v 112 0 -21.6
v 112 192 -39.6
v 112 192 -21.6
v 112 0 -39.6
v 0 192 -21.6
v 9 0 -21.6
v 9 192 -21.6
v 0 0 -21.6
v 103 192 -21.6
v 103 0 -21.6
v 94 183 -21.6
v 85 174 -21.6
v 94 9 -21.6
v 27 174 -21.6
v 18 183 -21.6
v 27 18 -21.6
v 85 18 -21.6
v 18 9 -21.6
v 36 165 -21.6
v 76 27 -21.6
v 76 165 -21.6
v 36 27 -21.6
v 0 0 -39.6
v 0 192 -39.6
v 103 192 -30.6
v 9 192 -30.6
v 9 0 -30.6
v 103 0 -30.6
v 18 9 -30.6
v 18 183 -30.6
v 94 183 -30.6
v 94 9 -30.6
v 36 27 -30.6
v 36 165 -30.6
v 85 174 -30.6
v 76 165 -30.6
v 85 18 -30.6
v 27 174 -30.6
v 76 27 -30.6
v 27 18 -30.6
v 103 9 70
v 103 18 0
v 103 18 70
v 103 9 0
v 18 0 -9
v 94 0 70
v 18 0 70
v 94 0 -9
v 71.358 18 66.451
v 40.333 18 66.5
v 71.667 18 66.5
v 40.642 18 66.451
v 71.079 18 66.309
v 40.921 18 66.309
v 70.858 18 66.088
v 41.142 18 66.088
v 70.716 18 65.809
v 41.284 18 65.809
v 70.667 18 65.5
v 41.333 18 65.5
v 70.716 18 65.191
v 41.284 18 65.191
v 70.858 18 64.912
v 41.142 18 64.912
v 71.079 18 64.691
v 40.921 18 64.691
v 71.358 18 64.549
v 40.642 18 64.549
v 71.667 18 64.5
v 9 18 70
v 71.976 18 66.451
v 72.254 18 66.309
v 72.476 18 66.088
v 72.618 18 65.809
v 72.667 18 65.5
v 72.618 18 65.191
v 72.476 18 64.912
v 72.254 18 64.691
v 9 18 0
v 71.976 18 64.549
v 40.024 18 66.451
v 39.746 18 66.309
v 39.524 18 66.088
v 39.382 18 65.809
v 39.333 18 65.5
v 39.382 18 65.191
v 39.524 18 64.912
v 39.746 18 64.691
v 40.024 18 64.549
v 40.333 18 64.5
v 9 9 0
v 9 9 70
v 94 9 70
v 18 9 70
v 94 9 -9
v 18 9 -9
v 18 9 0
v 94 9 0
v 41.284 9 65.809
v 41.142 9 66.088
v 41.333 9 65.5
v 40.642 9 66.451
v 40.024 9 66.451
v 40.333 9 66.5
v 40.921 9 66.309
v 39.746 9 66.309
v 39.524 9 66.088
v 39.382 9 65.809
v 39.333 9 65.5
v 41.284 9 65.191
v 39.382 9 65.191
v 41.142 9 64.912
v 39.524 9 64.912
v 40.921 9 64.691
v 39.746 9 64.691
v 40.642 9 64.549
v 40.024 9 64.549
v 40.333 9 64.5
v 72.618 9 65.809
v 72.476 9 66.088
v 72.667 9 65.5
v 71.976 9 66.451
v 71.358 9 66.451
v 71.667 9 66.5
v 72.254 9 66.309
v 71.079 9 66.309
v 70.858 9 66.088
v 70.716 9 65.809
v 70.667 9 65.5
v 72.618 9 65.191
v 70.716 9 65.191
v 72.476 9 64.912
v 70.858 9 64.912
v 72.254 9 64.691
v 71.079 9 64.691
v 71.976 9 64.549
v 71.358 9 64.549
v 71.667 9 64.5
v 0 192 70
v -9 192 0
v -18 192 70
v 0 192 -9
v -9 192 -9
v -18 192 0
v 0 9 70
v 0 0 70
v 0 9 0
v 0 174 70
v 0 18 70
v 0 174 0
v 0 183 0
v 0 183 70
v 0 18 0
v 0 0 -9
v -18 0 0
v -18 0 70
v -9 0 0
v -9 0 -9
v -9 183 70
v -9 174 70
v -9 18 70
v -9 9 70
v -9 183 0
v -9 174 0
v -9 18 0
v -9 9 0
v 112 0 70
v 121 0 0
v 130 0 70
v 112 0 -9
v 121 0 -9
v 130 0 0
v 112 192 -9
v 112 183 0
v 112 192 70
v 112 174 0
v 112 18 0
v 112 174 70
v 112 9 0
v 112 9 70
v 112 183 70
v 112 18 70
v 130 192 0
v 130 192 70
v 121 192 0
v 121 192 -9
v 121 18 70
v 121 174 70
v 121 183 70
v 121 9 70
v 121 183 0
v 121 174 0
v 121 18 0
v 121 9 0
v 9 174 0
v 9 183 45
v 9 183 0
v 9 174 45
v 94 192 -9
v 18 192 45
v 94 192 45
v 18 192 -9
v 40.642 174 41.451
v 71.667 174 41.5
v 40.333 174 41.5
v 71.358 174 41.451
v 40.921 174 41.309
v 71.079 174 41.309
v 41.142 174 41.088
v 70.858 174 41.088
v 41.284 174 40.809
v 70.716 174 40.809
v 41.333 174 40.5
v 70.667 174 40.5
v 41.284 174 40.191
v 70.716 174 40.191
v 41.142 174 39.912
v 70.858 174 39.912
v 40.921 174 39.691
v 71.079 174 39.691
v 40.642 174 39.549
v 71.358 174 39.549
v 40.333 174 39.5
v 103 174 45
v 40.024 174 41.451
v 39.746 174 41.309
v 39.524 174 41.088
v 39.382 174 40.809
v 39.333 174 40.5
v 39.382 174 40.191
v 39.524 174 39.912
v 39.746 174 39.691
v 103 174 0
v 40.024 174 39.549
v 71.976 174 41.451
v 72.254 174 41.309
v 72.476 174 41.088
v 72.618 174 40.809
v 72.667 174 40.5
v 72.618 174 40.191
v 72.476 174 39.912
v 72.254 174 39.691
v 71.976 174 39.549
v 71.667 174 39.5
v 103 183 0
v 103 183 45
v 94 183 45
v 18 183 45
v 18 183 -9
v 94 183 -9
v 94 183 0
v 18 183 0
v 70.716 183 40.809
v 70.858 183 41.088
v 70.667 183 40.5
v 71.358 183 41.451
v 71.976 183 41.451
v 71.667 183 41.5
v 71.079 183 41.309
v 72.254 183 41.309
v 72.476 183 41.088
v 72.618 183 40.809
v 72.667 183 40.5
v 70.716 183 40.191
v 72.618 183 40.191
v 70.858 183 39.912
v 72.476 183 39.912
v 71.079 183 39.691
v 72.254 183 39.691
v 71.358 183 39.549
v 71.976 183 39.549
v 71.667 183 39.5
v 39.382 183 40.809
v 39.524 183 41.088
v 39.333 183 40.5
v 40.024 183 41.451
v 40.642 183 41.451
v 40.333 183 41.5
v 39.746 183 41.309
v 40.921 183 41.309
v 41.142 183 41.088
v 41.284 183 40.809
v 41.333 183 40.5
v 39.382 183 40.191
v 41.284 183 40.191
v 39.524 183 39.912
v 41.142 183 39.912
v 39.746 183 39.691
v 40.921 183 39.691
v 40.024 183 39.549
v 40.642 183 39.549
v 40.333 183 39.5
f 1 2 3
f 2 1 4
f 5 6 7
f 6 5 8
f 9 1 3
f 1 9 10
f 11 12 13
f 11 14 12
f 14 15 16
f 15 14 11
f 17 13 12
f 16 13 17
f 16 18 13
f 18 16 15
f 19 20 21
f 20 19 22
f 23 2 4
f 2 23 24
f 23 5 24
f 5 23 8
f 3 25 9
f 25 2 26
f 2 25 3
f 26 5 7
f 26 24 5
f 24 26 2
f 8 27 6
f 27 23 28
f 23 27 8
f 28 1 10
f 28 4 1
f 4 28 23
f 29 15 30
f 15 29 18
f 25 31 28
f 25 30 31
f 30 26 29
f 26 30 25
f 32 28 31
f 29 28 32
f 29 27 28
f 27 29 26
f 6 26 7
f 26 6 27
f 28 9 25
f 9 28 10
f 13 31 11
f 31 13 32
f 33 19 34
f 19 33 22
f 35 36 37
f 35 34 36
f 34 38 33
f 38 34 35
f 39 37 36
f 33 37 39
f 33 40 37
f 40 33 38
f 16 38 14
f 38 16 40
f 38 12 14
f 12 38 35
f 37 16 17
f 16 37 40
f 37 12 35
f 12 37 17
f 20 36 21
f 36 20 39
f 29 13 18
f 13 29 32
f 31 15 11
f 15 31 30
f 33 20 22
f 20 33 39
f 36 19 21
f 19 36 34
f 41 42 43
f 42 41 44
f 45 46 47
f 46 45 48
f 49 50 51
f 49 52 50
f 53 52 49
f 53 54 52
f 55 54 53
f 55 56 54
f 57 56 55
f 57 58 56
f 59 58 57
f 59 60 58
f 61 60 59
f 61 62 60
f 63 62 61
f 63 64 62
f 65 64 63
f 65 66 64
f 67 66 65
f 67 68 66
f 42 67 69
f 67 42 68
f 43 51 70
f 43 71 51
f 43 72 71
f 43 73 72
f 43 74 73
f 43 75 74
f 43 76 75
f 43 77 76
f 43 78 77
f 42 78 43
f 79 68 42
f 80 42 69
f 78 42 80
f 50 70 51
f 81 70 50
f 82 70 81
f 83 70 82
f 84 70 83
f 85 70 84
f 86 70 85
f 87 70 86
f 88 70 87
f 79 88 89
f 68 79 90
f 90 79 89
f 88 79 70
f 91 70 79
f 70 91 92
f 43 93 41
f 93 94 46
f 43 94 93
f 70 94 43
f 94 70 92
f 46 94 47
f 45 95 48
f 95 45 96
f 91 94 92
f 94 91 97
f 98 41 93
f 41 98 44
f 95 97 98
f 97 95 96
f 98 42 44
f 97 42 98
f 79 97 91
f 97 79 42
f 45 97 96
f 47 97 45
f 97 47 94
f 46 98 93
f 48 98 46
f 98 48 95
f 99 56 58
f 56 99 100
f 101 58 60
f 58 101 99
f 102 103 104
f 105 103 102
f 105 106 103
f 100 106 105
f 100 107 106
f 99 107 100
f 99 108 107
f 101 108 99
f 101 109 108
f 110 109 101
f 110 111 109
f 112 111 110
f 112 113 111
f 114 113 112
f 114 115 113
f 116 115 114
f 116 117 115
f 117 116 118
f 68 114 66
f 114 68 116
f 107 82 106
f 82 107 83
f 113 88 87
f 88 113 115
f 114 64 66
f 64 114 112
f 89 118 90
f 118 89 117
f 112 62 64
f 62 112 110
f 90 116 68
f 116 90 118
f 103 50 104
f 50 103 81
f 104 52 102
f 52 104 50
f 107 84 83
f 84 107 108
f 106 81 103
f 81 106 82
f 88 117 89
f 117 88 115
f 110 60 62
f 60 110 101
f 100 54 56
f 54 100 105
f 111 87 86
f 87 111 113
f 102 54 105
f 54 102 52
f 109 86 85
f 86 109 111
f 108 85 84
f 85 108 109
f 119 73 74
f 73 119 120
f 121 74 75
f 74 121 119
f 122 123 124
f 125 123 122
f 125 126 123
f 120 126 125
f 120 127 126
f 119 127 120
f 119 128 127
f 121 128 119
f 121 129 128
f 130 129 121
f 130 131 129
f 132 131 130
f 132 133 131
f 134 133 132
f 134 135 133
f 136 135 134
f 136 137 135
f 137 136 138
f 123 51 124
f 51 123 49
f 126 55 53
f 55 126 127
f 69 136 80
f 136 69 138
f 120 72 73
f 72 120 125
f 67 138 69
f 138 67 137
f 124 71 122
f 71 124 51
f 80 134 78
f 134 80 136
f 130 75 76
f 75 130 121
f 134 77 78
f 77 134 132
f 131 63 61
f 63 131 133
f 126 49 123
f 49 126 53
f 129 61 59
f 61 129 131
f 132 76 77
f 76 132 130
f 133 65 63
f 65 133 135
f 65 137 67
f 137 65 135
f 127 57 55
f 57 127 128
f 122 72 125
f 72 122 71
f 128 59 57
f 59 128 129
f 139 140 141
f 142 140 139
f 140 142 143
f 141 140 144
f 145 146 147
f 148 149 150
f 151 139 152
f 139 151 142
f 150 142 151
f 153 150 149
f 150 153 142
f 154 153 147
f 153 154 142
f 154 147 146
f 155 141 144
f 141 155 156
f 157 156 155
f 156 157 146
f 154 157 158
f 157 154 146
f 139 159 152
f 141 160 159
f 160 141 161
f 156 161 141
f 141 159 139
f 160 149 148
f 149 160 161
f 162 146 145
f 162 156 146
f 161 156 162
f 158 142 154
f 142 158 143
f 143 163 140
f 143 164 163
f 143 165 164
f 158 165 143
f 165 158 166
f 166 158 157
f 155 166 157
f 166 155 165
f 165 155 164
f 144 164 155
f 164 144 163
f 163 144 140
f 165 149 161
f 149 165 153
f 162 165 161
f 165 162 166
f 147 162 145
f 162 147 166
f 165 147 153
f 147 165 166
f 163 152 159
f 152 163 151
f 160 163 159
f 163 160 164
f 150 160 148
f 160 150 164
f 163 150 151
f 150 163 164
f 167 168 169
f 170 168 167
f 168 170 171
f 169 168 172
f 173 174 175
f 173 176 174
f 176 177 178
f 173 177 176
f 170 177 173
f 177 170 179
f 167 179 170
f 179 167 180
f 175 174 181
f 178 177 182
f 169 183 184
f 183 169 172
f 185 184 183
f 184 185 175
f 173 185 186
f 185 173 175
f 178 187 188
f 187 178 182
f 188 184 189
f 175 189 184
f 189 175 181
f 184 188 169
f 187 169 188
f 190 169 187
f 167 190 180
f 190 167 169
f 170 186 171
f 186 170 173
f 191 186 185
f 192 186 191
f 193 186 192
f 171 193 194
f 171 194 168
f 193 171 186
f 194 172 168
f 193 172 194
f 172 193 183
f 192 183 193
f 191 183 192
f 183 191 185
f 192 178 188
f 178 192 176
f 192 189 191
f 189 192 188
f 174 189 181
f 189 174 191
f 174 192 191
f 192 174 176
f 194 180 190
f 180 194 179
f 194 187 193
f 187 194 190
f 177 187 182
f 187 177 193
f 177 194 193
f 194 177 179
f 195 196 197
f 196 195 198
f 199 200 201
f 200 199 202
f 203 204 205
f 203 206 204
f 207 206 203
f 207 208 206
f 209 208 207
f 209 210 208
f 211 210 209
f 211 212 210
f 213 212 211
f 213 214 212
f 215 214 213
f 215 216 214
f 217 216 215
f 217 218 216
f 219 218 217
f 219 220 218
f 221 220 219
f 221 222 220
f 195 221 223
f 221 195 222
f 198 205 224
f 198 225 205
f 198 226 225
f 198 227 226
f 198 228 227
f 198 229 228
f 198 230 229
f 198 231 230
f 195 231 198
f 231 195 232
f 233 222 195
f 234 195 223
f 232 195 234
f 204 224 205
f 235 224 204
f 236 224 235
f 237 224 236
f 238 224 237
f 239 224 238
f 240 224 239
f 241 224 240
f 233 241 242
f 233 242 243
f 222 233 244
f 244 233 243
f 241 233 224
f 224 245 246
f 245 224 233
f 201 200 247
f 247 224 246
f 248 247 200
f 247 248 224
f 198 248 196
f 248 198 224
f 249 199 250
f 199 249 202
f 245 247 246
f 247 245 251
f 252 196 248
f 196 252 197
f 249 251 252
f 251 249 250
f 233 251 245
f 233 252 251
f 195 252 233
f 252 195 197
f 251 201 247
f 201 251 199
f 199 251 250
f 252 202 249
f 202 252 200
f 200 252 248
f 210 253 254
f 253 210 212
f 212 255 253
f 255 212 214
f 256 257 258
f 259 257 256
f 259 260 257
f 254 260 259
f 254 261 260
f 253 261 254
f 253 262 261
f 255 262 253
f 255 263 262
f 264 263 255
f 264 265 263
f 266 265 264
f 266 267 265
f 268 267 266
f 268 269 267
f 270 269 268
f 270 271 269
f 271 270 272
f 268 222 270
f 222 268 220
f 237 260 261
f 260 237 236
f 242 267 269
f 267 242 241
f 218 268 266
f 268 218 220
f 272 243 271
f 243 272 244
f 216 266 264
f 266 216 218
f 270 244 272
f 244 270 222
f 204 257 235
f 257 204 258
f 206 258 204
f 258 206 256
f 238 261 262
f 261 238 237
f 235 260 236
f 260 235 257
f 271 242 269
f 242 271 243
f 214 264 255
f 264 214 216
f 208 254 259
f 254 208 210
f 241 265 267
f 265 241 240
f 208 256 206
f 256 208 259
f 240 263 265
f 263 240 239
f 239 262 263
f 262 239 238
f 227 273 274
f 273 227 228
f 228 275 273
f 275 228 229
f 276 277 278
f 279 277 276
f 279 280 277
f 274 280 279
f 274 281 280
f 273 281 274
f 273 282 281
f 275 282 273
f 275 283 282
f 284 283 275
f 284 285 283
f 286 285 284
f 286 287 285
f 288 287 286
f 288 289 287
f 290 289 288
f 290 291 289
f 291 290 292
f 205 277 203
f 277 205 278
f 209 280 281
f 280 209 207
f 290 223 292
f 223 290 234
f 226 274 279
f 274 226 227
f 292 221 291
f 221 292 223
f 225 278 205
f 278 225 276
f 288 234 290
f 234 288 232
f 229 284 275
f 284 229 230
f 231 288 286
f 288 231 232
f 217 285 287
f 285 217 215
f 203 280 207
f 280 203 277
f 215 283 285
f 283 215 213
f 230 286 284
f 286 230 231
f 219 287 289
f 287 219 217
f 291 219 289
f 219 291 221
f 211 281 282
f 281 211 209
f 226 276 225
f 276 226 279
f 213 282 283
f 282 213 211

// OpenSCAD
// pinetrim 230x18mm
// 110mm plate - 10mm gap - 110mm plate

inner_width = 40;
inner_length = 120;
inner_height = 50;

waterline = 20;
back_flashing_thickness = 5;

// predrill holes diameter
prehole = 2;

groove_depth = 9;
groove_width = 9;
seal_thickness = 3; // 4mm real
sealed_groove_depth = groove_depth - seal_thickness;

panel_thickness = groove_depth * 2;

outer_width = inner_width + panel_thickness * 4;
outer_length = inner_length + panel_thickness * 4;
outer_height = inner_height + groove_depth + waterline;

module plate () {
    difference() {
        // plate
        cube([outer_width, outer_length, panel_thickness]);
        
        // outer sides grooves
        translate([groove_width, 0, groove_depth])
            cube([groove_width, outer_length, groove_depth]);
        translate([outer_width - groove_width * 2, 0, groove_depth])
            cube([groove_width, outer_length, groove_depth]);
        
        // inner sides grooves
        translate([groove_width * 3, panel_thickness, groove_depth])
            cube([groove_width, outer_length - panel_thickness * 2, groove_depth]);
        translate([outer_width - groove_width * 4, panel_thickness, groove_depth])
            cube([groove_width, outer_length - panel_thickness * 2, groove_depth]);
        
        // outer ends grooves
        translate([groove_width, 0, groove_depth])
            cube([outer_width - groove_width * 2, groove_width, groove_depth]);
        translate([groove_width, outer_length - groove_width, groove_depth])
            cube([outer_width - groove_width * 2, groove_width, groove_depth]);
        
        // inner ends grooves
        translate([groove_width * 3, groove_width * 2, groove_depth])
            cube([outer_width - groove_width * 7, groove_width, groove_depth]);
        translate([groove_width * 3, outer_length - groove_width * 3, groove_depth])
            cube([outer_width - groove_width * 7, groove_width, groove_depth]);
    }
}

module panel_front_outer () {
    difference() {
        panel_width = outer_width - groove_width * 2;

        // panel
        cube([panel_width, outer_height, panel_thickness]);

        // bottom groove
        cube([panel_width, groove_depth, groove_width]);
        
        // side grooves
        translate([0, 0, groove_width])
            cube([groove_width, outer_height + groove_width, groove_width]);
        translate([panel_width - groove_width, 0, groove_width])
            cube([groove_width, outer_height + groove_width, groove_width]);

        // preholes
        translate([panel_width / 3, outer_height - groove_depth / 2, 0])
            cylinder(panel_thickness / 2, prehole / 2, prehole / 2, $fn = 20);
        translate([panel_width * 2 / 3, outer_height - groove_depth / 2, 0])
            cylinder(panel_thickness / 2, prehole / 2, prehole / 2, $fn = 20);
    }
}


module panel_back_outer () {
    difference() {
        panel_width = outer_width - groove_width * 2;
        panel_height = outer_height - waterline - back_flashing_thickness;

        // panel
        cube([panel_width, panel_height, panel_thickness]);

        // bottom groove
        cube([panel_width, groove_depth, groove_width]);
        
        // side grooves
        translate([0, 0, groove_width])
            cube([groove_width, panel_height + groove_width, groove_width]);
        translate([panel_width - groove_width, 0, groove_width])
            cube([groove_width, panel_height + groove_width, groove_width]);

        // preholes
        translate([panel_width / 3, panel_height - groove_depth / 2, 0])
            cylinder(panel_thickness / 2, prehole / 2, prehole / 2, $fn = 20);
        translate([panel_width * 2 / 3, panel_height - groove_depth / 2, 0])
            cylinder(panel_thickness / 2, prehole / 2, prehole / 2, $fn = 20);
    }
}

module panel_side_outer () {
    difference() {
        // panel
        cube([outer_length, outer_height, panel_thickness]);
        
        // bottom groove
        cube([outer_length, groove_depth, groove_width]);
        
        // side grooves
        translate([groove_width, groove_depth, groove_width])
            cube([groove_width, outer_height + groove_width, groove_width]);
        translate([outer_length - groove_width * 2, groove_depth, groove_width])
            cube([groove_width, outer_height + groove_width, groove_width]);
    }
}












// for reference
translate([0, 0, -panel_thickness * 2.2]) plate();

rotate([90, 0, 0]) translate([groove_width, -groove_depth, -panel_thickness])
    panel_front_outer();

rotate([90, 0, 90]) translate([0, -groove_depth, -panel_thickness])
    panel_side_outer();

rotate([90, 0, 270]) translate([-outer_length, -groove_depth, -panel_thickness - outer_width])
    panel_side_outer();

rotate([90, 0, 180]) translate([-outer_width + groove_width, -groove_depth, outer_length - panel_thickness])
    panel_back_outer();

/* */
